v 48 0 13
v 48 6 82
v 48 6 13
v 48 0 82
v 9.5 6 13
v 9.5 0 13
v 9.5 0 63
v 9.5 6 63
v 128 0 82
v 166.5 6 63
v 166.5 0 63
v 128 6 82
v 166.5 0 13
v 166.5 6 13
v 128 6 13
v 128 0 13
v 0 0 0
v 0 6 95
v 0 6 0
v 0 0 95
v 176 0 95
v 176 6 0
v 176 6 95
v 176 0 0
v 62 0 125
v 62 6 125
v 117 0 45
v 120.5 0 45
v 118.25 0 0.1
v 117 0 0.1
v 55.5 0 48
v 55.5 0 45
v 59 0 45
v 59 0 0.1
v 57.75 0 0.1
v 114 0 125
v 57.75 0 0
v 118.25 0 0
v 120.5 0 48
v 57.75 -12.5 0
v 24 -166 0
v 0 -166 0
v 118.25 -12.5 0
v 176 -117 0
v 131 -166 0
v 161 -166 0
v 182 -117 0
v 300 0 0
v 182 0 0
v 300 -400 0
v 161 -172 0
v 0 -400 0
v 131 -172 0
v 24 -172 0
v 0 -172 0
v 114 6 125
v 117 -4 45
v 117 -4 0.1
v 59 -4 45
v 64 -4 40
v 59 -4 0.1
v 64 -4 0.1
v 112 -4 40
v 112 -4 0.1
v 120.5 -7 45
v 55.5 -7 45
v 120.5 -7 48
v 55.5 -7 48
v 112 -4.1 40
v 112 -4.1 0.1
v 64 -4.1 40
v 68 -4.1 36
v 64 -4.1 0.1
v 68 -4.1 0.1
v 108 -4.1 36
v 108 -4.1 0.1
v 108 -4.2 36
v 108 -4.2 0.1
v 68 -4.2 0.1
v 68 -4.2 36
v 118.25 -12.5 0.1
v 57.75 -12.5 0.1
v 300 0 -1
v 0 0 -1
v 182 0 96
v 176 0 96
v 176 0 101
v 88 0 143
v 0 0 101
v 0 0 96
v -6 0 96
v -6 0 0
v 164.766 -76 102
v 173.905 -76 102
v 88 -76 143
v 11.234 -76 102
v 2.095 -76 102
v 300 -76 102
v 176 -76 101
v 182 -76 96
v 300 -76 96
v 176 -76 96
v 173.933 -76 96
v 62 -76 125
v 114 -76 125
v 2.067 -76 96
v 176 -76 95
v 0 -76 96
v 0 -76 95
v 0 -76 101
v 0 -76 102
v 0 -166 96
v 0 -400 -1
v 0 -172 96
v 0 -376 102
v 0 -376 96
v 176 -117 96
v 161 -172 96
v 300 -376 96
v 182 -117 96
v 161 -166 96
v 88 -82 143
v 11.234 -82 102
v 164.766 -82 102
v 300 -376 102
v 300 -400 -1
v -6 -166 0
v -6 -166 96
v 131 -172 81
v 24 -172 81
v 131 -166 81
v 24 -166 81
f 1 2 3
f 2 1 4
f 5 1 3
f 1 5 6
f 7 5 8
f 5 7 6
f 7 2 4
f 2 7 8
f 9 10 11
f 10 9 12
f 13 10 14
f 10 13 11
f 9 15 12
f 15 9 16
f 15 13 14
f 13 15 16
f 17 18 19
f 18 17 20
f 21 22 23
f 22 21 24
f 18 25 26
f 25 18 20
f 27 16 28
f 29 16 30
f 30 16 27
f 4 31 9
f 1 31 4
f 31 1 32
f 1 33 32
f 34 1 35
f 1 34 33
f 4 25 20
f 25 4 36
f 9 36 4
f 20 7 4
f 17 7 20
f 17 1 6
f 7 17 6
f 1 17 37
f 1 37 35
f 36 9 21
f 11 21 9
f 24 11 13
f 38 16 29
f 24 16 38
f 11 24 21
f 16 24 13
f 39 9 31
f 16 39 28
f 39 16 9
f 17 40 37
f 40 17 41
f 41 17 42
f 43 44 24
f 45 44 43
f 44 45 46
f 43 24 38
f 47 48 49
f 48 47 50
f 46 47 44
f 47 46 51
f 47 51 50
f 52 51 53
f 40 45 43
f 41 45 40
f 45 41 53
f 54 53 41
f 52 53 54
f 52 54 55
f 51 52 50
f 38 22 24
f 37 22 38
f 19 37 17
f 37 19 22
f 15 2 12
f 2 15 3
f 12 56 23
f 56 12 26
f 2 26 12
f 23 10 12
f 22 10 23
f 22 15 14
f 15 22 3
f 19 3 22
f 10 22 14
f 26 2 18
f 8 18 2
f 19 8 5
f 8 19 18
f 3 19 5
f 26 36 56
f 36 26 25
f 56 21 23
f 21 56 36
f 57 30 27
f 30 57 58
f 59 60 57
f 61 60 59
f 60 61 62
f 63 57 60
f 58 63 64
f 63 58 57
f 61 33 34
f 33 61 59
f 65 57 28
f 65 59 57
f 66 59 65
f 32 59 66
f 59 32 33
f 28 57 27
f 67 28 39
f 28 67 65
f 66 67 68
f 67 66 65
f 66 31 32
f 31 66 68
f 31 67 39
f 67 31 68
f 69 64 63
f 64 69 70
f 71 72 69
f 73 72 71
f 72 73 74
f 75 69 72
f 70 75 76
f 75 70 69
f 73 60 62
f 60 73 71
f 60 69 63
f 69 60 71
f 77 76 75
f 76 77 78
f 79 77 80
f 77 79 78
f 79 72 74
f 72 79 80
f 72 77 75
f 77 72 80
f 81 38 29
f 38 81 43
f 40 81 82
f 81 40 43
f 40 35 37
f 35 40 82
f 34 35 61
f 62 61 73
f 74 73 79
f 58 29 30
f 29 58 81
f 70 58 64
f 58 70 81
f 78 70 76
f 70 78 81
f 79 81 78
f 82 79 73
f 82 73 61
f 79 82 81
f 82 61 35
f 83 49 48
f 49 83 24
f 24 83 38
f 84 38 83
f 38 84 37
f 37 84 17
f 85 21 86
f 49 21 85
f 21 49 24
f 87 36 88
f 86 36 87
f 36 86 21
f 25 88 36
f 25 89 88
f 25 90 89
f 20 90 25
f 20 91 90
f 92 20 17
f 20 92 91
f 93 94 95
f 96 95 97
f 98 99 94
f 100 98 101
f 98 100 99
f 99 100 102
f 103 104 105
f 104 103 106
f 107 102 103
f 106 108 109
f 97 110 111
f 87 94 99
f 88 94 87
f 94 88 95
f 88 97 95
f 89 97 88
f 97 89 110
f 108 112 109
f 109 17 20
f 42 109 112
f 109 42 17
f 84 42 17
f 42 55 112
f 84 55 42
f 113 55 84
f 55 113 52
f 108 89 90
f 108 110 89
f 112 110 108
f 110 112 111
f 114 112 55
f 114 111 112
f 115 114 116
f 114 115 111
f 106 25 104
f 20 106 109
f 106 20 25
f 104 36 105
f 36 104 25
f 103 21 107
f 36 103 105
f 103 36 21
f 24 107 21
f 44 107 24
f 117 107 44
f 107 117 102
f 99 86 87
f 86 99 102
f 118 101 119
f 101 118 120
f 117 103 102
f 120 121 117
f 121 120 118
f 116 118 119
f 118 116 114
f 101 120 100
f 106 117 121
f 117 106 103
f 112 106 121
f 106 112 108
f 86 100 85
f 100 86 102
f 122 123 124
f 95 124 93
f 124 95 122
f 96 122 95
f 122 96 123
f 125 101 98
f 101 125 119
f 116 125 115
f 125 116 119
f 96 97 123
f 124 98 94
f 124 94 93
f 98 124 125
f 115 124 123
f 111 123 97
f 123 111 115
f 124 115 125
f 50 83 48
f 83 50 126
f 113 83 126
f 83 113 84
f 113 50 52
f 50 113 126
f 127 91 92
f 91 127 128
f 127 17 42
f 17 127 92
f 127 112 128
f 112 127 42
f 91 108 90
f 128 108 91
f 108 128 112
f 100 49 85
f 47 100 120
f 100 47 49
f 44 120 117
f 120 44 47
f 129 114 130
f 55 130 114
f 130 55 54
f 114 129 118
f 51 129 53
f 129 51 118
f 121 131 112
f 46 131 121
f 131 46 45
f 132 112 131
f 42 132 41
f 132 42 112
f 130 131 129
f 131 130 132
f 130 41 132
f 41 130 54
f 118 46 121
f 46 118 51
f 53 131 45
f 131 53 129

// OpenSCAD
module oak() {
    color([237, 209, 142]/255) children();
}

module marble() {
    color([23, 115, 66]/255) children();
}

module gold() {
    color([153, 145, 0]/255) children();
}

module wall() {
    color([223, 245, 243]/255) translate([0,0,-6]) linear_extrude(6)  children();
}

module laminate() {
    color([110, 69, 34]/255) children();
}

module plaster() {
    color([1,1,1]) children();
}

module window1() {
    bl = [0,0];
    br = bl + [38.5,0];
    tl = bl + [0,50];
    tr = br + [0,69];
    translate([0,0,-10]) linear_extrude( 15 ) polygon([bl,br,tr,tl]);
}

fireplace_wall_width = 176;
module fireplace_wall() {
    width = fireplace_wall_width;
    bl = [0,0];
    br = [width,0];
    tr = br + [0,95];
    tl = bl + [0,95];
    mr = br + [-62,125];
    ml = bl + [62,125];
    
    // wall
    difference() {
        wall() polygon([bl, br, tr, mr, ml, tl ]);
        union() {
            translate([9.5,13]) window1();
            translate([br[0]-9.5,13,0]) scale([-1,1]) window1();
        }
    }
    
    // fireplace
    oak() translate([(width-58)/2,0,0]) cube([58,45,4]);
    oak() translate([ (width-65)/2,45,0 ]) cube([65, 3, 4+3]);
    gold() translate([ (width-48)/2,0,0 ]) cube([48, 40, 4.1]);
    color( "black" ) translate([ (width-40)/2,0,0 ]) cube([40, 36, 4.2]);
    marble() translate([ (width-60.5)/2,0,0]) cube([60.5, 0.1, 12.5]);

    // vaulted ceiling
    peak = (ml+mr)/2 + [0,18];
    roof_offset = [0,6];
    plaster() linear_extrude(76) polygon( [tl, ml, mr, tr, tr+roof_offset, peak, tl+roof_offset]);
    plaster() linear_extrude(76) polygon( [tl, ml, mr, tr, tr+roof_offset, peak, tl+roof_offset]);
    plaster() translate([0,0,76]) linear_extrude(6) polygon( [tl+[0,1], tr+[0,1], peak] );
    ceiling_width = 300;
    plaster() translate([0,0,76]) linear_extrude(300) polygon( [[0,96], [ceiling_width,96], [ceiling_width,102], [0,102]] );
}

left_wall_width = 166;
module left_wall() {
    bl = [0,0];
    br = bl + [left_wall_width,0];
    tr = br + [0,96];
    tl = bl + [0,96];
    wall() polygon([bl, br, tr, tl]);
}

module right_wall() {
    bl = [0,0];
    br = bl + [117,0];
    tr = br + [0,96];
    tl = bl + [0,96];
    wall() polygon([bl, br, tr, tl]);
}


back_wall_width = 161;
module back_wall() {
    bl = [0,0];
    br = bl + [back_wall_width,0];
    tr = br + [0,96];
    tl = bl + [0,96];
    ll = bl + [30,0];
    ul = ll + [0,81];
    lr = br + [-24,0];
    ur = lr + [0,81];
    wall() polygon([bl, ll, ul, ur, lr, br, tr, tl]);
}

laminate() translate([0,-400,-1]) cube([300,400,1]); //floor
rotate([90,0,0]) fireplace_wall();
rotate([0,0,90]) rotate([90,0,0]) translate([-left_wall_width,0,0]) left_wall();
translate([fireplace_wall_width,0,0]) rotate([0,0,-90]) rotate([90,0,0]) right_wall();
translate([back_wall_width,-left_wall_width,0]) rotate([0,0,180]) rotate([90,0,0]) back_wall();
